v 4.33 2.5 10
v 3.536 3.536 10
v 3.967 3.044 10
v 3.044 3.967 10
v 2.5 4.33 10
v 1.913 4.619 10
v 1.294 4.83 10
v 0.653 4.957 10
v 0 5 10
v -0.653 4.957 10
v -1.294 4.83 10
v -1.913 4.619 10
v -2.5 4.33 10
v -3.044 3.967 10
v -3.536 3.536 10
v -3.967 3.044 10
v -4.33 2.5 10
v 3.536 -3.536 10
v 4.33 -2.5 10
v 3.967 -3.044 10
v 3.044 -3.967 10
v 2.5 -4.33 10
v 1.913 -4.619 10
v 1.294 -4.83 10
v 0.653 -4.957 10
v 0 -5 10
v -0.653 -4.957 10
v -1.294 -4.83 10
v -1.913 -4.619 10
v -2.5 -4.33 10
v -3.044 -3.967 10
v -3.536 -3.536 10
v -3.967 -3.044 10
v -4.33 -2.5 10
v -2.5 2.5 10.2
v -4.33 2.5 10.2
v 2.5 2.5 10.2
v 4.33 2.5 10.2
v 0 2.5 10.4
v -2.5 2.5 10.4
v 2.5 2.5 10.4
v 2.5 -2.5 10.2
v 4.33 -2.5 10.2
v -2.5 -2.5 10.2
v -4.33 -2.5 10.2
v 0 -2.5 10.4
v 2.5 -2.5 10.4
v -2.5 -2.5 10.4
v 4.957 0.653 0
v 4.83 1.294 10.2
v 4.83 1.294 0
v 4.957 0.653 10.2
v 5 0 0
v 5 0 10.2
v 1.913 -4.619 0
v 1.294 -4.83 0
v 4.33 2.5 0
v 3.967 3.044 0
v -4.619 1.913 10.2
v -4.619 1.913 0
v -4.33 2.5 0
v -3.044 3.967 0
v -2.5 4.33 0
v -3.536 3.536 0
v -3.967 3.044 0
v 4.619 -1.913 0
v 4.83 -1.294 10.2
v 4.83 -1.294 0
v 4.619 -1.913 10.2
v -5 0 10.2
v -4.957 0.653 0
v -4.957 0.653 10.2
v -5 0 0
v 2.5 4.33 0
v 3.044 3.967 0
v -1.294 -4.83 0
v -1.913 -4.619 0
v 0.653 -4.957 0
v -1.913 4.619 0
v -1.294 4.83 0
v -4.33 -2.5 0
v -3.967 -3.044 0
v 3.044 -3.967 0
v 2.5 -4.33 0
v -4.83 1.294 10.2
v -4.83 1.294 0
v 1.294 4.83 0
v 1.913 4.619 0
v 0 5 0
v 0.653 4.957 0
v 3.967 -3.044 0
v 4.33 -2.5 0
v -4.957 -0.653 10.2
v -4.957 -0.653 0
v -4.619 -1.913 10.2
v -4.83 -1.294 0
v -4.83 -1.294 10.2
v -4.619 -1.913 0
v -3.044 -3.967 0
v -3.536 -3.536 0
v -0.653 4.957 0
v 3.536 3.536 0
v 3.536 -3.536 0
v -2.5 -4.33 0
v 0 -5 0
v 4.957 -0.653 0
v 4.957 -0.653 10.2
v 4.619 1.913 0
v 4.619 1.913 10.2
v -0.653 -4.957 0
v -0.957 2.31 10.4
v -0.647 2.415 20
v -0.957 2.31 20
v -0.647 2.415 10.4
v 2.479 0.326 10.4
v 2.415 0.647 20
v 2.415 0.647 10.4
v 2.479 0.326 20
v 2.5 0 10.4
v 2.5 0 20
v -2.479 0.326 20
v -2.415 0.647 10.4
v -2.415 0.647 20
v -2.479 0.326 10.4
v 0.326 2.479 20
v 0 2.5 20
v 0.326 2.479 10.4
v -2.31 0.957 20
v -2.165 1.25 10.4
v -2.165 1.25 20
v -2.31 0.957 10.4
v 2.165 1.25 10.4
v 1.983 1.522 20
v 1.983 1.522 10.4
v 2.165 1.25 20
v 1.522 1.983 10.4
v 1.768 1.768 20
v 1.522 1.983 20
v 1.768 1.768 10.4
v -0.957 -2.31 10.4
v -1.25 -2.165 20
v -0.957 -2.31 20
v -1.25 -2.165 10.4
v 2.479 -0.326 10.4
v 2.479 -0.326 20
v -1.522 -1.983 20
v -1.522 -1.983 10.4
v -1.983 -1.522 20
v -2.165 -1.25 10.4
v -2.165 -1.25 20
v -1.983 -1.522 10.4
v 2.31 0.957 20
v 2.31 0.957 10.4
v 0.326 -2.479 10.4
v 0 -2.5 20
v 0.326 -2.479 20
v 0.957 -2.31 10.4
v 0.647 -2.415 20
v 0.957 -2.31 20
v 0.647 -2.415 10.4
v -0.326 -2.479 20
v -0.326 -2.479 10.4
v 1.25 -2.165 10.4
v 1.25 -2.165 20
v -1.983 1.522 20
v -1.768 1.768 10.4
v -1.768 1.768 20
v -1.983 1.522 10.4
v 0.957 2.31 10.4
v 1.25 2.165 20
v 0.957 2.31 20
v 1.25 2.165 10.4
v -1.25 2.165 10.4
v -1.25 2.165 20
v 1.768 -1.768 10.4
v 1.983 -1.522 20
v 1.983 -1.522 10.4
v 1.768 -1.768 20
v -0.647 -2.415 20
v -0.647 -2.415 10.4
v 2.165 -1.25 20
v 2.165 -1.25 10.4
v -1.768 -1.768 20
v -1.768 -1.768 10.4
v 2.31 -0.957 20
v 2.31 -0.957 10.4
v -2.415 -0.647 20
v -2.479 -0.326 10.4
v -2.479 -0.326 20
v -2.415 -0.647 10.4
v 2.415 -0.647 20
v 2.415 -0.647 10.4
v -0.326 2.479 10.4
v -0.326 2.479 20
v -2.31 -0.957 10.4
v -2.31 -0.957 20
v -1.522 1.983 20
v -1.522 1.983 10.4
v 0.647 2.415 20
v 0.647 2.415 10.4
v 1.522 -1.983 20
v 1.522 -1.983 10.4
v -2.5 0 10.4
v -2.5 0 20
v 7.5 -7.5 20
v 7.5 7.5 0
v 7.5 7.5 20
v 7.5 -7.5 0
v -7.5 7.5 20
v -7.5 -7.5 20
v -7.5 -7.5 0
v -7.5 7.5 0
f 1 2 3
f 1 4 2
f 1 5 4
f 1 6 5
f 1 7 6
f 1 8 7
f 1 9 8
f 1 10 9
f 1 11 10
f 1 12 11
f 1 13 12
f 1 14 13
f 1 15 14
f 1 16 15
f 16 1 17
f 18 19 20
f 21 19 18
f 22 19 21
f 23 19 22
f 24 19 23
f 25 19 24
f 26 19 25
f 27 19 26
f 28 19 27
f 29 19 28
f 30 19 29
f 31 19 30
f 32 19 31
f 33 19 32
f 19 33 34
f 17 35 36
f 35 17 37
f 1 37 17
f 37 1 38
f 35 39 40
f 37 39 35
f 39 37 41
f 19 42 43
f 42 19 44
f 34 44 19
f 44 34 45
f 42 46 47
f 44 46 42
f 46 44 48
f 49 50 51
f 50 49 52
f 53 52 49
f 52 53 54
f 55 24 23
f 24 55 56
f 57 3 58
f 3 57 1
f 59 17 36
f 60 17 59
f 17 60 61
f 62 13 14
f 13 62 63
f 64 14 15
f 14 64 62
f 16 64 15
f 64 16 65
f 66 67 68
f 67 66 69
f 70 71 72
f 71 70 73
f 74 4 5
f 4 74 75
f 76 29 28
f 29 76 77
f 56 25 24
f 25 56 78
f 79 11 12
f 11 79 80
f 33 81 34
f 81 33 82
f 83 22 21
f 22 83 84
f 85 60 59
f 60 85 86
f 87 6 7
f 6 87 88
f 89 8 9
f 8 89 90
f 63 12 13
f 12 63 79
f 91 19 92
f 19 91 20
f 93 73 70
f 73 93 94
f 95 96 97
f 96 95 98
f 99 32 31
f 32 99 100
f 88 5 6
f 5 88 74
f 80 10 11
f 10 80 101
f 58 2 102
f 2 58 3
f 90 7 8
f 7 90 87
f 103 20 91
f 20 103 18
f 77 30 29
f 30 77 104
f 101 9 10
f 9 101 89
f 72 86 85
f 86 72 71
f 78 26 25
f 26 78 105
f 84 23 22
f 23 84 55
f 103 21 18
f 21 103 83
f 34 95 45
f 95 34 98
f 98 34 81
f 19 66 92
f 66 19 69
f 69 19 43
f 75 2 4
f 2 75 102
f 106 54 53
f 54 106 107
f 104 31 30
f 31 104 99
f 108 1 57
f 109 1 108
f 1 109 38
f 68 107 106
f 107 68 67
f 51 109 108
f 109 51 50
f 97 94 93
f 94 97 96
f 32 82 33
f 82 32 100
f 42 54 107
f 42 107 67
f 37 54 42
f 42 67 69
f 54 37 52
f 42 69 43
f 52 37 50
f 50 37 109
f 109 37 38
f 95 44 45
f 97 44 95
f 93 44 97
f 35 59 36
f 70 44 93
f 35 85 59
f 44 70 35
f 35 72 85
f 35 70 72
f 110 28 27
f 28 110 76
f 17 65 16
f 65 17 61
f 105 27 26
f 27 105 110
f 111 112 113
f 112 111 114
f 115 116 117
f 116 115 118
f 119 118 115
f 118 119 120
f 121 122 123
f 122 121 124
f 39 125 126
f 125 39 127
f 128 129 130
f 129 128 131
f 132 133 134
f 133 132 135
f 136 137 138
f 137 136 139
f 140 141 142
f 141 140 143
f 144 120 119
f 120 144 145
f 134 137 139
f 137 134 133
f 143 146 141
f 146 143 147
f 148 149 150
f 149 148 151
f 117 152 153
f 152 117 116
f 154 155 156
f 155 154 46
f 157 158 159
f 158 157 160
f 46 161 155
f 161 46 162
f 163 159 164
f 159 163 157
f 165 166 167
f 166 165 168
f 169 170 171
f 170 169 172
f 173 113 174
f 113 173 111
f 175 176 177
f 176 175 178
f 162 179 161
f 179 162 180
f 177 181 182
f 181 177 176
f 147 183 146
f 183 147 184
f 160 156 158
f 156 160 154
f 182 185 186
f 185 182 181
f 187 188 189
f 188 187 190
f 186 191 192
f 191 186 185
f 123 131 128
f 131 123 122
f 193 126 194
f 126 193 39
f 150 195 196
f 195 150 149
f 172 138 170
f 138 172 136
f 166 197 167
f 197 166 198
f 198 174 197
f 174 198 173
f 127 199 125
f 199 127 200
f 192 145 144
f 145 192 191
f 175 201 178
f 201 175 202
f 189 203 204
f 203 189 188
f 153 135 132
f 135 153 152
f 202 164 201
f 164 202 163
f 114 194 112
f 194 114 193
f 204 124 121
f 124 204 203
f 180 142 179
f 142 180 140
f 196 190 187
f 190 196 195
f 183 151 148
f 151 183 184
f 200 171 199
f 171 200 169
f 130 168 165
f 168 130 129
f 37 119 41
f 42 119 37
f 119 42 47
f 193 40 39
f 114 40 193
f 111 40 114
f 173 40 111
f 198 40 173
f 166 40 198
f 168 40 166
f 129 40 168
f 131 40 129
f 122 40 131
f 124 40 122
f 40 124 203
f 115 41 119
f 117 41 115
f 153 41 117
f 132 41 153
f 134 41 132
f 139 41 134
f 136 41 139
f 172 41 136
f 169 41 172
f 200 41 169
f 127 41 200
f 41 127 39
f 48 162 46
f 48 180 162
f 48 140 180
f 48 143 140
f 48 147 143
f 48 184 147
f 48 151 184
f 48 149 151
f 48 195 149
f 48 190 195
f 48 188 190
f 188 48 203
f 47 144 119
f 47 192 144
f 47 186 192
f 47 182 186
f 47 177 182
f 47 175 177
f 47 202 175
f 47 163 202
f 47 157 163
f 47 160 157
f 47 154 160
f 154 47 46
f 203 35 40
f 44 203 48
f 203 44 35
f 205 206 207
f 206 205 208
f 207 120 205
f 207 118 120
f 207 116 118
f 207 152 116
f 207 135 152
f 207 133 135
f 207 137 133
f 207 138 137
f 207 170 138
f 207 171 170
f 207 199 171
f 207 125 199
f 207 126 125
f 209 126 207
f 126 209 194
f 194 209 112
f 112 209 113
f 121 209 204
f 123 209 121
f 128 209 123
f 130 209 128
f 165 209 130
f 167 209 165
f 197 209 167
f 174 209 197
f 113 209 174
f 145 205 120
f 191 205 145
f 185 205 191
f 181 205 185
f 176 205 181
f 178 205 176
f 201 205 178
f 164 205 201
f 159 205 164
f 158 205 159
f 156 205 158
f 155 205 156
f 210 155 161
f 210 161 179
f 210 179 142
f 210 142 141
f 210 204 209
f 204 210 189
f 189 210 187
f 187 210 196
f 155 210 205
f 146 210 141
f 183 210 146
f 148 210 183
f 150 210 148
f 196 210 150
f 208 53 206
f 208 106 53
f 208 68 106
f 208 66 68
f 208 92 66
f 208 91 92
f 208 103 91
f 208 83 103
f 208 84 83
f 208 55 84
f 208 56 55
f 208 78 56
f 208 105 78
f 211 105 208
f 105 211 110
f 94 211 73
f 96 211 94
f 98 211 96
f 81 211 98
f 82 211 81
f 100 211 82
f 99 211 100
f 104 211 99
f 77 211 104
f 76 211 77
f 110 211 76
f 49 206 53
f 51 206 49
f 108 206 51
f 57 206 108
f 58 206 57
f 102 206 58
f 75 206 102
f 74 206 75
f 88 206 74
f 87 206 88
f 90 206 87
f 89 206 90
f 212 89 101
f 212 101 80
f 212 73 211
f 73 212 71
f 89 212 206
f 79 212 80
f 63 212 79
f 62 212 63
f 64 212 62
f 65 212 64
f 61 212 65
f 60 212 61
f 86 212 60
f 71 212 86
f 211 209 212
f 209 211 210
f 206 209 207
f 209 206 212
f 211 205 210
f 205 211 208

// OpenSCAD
diamLower = 10;
diamUpper = 5;
lenLower = 10;
lenUpper = 10;
layerThickness = 0.2;
circleEdges = 48;

FN = circleEdges;

difference()
{
  translate([0, 0, (lenLower+lenUpper) / 2])
    cube([diamLower+5, diamLower+5, lenLower+lenUpper], true);
  union()
  {
    difference()
    {
      translate([0, 0, -1])
      cylinder(lenLower + layerThickness+1, diamLower/2, diamLower/2, $fn = FN);
      translate([0, 0, lenUpper+layerThickness])
        difference()
        {
          cube([diamLower+1, diamLower+1, 2*layerThickness], true);
          cube([diamLower+2, diamUpper, 2*layerThickness+1], true);
        }
    }
    translate([0, 0, lenLower + layerThickness])
      cylinder(lenUpper - layerThickness+1, diamUpper/2, diamUpper/2, $fn = FN);
    translate([0, 0, lenLower + layerThickness*1.5])
      cube([diamUpper, diamUpper, layerThickness], true);
  }
}
